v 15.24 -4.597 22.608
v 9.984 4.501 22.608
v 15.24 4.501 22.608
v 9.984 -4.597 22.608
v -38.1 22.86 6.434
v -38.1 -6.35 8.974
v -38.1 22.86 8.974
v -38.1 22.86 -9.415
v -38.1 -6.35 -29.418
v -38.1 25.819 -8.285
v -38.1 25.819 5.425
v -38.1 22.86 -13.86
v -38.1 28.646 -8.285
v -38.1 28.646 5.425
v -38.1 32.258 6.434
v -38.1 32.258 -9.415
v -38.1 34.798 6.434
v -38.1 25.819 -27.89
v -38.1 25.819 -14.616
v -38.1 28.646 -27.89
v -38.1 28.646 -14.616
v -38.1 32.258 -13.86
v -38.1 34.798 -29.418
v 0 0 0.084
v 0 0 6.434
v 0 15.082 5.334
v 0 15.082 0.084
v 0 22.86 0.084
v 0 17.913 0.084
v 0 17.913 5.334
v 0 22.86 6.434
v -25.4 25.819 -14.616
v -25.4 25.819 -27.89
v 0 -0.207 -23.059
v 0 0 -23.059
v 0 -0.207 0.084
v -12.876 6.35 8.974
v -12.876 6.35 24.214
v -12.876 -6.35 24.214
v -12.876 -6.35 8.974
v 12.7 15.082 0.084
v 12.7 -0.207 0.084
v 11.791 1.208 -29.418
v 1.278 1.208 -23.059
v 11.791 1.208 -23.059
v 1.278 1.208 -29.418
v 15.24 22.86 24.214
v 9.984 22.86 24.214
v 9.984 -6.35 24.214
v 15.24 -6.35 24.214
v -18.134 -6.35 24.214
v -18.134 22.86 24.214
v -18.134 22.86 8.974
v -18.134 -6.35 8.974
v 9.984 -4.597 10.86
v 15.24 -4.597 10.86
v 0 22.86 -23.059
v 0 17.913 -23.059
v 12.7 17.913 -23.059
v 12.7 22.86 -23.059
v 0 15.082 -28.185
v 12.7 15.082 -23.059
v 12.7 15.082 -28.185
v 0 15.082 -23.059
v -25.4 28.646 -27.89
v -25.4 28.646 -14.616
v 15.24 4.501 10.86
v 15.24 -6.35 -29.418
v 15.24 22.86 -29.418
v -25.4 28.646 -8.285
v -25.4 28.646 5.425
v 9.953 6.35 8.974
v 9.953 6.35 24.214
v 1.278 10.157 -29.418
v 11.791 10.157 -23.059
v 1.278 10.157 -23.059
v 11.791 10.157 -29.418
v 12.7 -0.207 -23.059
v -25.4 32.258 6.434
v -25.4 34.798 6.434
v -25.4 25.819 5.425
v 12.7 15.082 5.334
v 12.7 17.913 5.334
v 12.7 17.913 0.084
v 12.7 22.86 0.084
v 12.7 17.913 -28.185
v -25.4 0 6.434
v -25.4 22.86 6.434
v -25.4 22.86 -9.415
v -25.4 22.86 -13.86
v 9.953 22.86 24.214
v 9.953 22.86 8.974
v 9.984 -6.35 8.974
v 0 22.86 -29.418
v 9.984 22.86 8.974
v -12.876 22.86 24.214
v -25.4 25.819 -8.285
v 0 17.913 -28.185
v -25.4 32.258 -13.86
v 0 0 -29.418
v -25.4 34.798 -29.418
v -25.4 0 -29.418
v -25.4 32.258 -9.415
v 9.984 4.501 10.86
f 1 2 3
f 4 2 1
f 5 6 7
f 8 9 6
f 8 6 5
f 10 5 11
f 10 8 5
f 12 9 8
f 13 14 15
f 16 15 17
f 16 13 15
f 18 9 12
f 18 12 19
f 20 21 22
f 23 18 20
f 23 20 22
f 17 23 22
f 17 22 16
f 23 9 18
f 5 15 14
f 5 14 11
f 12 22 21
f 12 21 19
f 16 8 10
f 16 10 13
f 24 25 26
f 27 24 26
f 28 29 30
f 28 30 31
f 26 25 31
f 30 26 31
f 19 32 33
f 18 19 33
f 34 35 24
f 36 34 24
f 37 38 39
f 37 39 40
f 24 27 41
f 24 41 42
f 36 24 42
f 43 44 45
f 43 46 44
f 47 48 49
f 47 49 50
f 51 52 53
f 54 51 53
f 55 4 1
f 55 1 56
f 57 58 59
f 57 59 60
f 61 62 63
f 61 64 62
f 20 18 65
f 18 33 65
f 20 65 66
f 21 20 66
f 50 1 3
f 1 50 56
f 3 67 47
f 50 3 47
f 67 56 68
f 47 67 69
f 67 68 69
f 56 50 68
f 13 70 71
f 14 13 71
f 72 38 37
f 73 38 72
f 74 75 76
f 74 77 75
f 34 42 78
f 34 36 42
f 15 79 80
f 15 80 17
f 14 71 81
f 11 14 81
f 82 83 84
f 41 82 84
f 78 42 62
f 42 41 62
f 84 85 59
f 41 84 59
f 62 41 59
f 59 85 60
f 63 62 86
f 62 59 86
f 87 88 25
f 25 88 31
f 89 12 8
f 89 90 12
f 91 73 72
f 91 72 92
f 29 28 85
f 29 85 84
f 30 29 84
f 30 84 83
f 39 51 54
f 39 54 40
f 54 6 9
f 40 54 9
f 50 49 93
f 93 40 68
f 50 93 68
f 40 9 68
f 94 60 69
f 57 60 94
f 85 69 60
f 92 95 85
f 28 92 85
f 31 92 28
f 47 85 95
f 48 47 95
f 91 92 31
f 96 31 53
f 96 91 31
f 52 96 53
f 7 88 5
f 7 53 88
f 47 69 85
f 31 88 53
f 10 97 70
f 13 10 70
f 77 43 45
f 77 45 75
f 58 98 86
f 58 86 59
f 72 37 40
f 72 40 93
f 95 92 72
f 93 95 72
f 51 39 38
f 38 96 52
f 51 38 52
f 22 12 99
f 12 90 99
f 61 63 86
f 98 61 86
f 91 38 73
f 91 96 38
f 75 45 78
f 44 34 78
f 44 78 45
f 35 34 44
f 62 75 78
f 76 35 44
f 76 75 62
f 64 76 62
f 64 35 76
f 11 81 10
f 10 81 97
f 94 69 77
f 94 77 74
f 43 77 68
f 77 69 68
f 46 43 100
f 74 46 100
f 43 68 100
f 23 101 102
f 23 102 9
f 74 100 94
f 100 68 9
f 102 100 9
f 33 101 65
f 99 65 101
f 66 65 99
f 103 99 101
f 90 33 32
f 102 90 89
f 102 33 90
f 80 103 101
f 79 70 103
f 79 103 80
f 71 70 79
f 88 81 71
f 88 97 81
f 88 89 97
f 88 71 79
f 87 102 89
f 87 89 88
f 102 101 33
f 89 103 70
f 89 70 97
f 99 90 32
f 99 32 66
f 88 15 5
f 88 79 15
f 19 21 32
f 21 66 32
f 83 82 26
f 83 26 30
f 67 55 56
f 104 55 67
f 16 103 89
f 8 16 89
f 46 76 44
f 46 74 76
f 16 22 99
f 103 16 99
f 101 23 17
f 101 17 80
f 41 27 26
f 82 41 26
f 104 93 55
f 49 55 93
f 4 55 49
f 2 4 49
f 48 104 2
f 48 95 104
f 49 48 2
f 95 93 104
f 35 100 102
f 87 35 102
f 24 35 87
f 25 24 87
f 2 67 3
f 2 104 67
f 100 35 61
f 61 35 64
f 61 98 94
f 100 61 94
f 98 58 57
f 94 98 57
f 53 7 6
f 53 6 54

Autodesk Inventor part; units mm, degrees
ref_plane "YZ Plane" through (0, 0, 0) normal (1, 0, 0) x (0, 1, 0)
ref_plane "XZ Plane" through (0, 0, 0) normal (0, 1, 0) x (-1, 0, 0)
ref_plane "XY Plane" through (0, 0, 0) normal (0, 0, 1) x (1, 0, 0)
sketch "Sketch1" plane through (0, 0, 0) normal (1, 0, 0) x (0, 1, 0)
  line L0 (0, 0) -> (22.86, 0)
  line L1 (22.86, 0) -> (22.86, -22.86)
  line L2 (22.86, -22.86) -> (0, -22.86)
  line L3 (0, -22.86) -> (0, 0)
  line L4 (0, -22.86) -> (15.24, -22.86)
  line L5 (0, -22.86) -> (15.24, -22.86) construction
  line L6 (15.24, -22.86) -> (15.24, -27.94)
  line L7 (15.24, -27.94) -> (17.78, -27.94)
  line L8 (17.78, -27.94) -> (17.78, -22.86)
  line L9 (17.78, 0) -> (17.78, 5.08)
  line L10 (17.78, 5.08) -> (15.24, 5.08)
  line L11 (15.24, 5.08) -> (15.24, 0)
  line L12 (17.9128, 0) -> (15.0818, 0)
  line L13 (15.0818, 5.3336) -> (17.9128, 5.3336)
  line L14 (17.9128, -22.86) -> (15.0818, -22.86)
  line L15 (15.0818, -28.1853) -> (17.9128, -28.1853)
  line L16 (17.9128, 0.0837) -> (17.9128, 5.3336)
  line L17 (15.0818, 0.0837) -> (15.0818, 5.3336)
  line L18 (15.0818, 0.0837) -> (-0.2071, 0.0837)
  line L19 (-0.2071, 0.0837) -> (-0.2071, -23.0588)
  line L20 (-0.2071, -23.0588) -> (15.0818, -23.0588)
  line L21 (15.0818, -23.0588) -> (15.0818, -28.1853)
  line L22 (17.9128, -28.1853) -> (17.9128, -23.0588)
  line L23 (17.9128, -23.0588) -> (22.86, -23.0588)
  line L24 (22.86, -23.0588) -> (22.86, -29.4177)
  line L25 (22.86, -29.4177) -> (-6.35, -29.4177)
  line L26 (22.86, 0.0837) -> (17.9128, 0.0837)
  line L27 (22.86, 0.0837) -> (22.86, 6.4337)
  line L28 (22.86, 6.4337) -> (-6.35, 6.4337)
  line L29 (-6.35, -29.4177) -> (-6.35, 6.4337)
  dimension "d0" = 22.86
  dimension "d1" = 22.86
  dimension "d4" = 5.08
  dimension "d5" = 2.54
  dimension "d6" = 5.08
  dimension "d7" = 2.54
  dimension "d9" = 29.21
  dimension "d11" = 6.35
extrude "Extrusion1" add sketch "Sketch1" along normal blind 12.7 contours L17 L18 L19 L20 L21 L15 L22 L23 L24 L25 L29 L28 L27 L26 L16 L13
sketch "Sketch2" plane through (12.7, 0, 0) normal (1, 0, 0) x (0, 0, -1)
  line L0 (-6.4337, 22.86) -> (-6.4337, -6.35) projected
  line L1 (29.4177, 22.86) -> (23.0588, 22.86) projected
  line L2 (-6.4337, -6.35) -> (29.4177, -6.35)
  line L3 (29.4177, -6.35) -> (29.4177, 22.86)
  line L4 (29.4177, 22.86) -> (-6.4337, 22.86)
  line L5 (-6.4337, 22.86) -> (-6.4337, -6.35)
  point P0 (0, 0)
  dimension "d16" = 29.21
  dimension "d17" = 35.8513
extrude "Extrusion2" add sketch "Sketch2" along normal blind 2.54
sketch "Sketch3" plane through (0, 0, 0) normal (-1, 0, 0) x (0, 0, 1)
  line L0 (-29.4177, -6.35) -> (-29.4177, 22.86) projected
  line L1 (6.4337, -6.35) -> (-29.4177, -6.35) projected
  line L2 (-29.4177, 0) -> (6.4337, 0)
  line L3 (6.4337, 0) -> (6.4337, -6.35)
  line L4 (6.4337, -6.35) -> (-29.4177, -6.35)
  line L5 (-29.4177, -6.35) -> (-29.4177, 0)
  point P0 (0, 0)
extrude "Extrusion3" add sketch "Sketch3" along normal blind 25.4
sketch "Sketch4" plane through (-25.4, 0, 0) normal (-1, 0, 0) x (0, 0, 1)
  line L0 (6.4337, -6.35) -> (-29.4177, -6.35) projected
  line L1 (6.4337, 22.86) -> (6.4337, -6.35) projected
  line L2 (-29.4177, -6.35) -> (6.4337, -6.35)
  line L3 (6.4337, -6.35) -> (6.4337, 22.86)
  line L4 (-29.4177, 22.86) -> (-29.4177, -6.35)
  line L5 (6.4337, 32.258) -> (-29.4177, 32.258)
  line L6 (-29.4177, 32.258) -> (-29.4177, 22.86)
  line L7 (-29.4177, 32.258) -> (-7.1927, 32.258)
  line L8 (-7.1927, 32.258) -> (-11.6377, 32.258)
  line L9 (-29.4177, 22.86) -> (6.4337, 22.86) projected
  line L10 (-11.6377, 32.258) -> (-9.4152, 32.258)
  line L11 (-9.4152, 22.86) -> (-11.6377, 22.86)
  line L12 (-9.4152, 22.86) -> (-13.8602, 22.86)
  line L13 (-13.8602, 22.86) -> (-13.8602, 32.258)
  line L14 (-13.8602, 32.258) -> (-9.4152, 32.258)
  line L15 (-27.8895, 28.6463) -> (-14.6164, 28.6463)
  line L16 (-14.6164, 28.6463) -> (-14.6164, 25.8191)
  line L17 (-14.6164, 25.8191) -> (-27.8895, 25.8191)
  line L18 (-27.8895, 25.8191) -> (-27.8895, 28.6463)
  line L19 (-8.2851, 28.6463) -> (5.4248, 28.6463)
  line L20 (5.4248, 28.6463) -> (5.4248, 25.8191)
  line L21 (5.4248, 25.8191) -> (-8.2851, 25.8191)
  line L22 (-8.2851, 25.8191) -> (-8.2851, 28.6463)
  line L23 (-8.2851, 28.6463) -> (5.4248, 28.6463)
  line L24 (5.4248, 28.6463) -> (5.4248, 25.8191)
  line L25 (5.4248, 25.8191) -> (-8.2851, 25.8191)
  line L26 (-8.2851, 25.8191) -> (-8.2851, 28.6463)
  line L27 (6.4337, 32.258) -> (-9.4152, 32.258)
  line L28 (-9.4152, 32.258) -> (-9.4152, 22.86)
  line L29 (-9.4152, 22.86) -> (6.4337, 22.86)
  line L30 (6.4337, 22.86) -> (6.4337, 32.258)
  line L31 (-29.4177, -6.35) -> (-29.4177, 22.86) projected
  line L32 (0.0837, 22.86) -> (6.4337, 22.86) projected
  line L33 (-29.4177, 22.86) -> (6.4337, 22.86)
  line L34 (6.4337, 22.86) -> (6.4337, 32.258)
  line L35 (6.4337, 32.258) -> (-29.4177, 32.258)
  line L36 (-29.4177, 22.86) -> (-29.4177, 32.258)
  point P0 (0, 0)
  dimension "d21" = 22.225
  dimension "d23" = 2.2225
  dimension "d24" = 4.445
extrude "Extrusion7" add sketch "Sketch4" along normal blind 12.7 contours L0 L4 L9 L1 | L9 L28 L5 L30 | L6 L5 L13 L9
sketch "Sketch6" plane through (-25.4, 32.258, -13.8602) normal (0, 1, 0) x (1, 0, 0)
  line L0 (0, 15.5575) -> (-12.7, 15.5575) projected
  line L1 (0, -20.2938) -> (-12.7, -20.2938) projected
  line L2 (-12.7, 15.5575) -> (0, 15.5575)
  line L3 (0, 15.5575) -> (0, -20.2938)
  line L4 (0, -20.2938) -> (-12.7, -20.2938)
  line L5 (-12.7, -20.2938) -> (-12.7, 15.5575)
  point P0 (25.4, -13.8602)
extrude "Extrusion8" add sketch "Sketch6" along normal blind 2.54
sketch "Sketch7" plane through (0, 22.86, 6.4337) normal (0, 0, 1) x (1, 0, 0)
  line L0 (0, 0) -> (15.24, 0) projected
  line L1 (-38.1, -29.21) -> (-38.1, 11.938) projected
  line L2 (15.24, 0) -> (-38.1, 0)
  line L3 (-38.1, 0) -> (-38.1, -29.21)
  line L4 (-38.1, -29.21) -> (15.24, -29.21)
  line L5 (15.24, -29.21) -> (15.24, 0)
  point P0 (0, -22.86)
extrude "Extrusion9" add sketch "Sketch7" along normal blind 2.54
sketch "Sketch8" plane through (0, 22.86, -23.0588) normal (0, 1, 0) x (1, 0, 0)
  line L0 (15.24, -32.0324) -> (-38.1, -32.0324) projected
  line L1 (-12.8761, -32.0324) -> (9.9839, -32.0324)
  line L2 (-12.8761, -47.2724) -> (-12.8761, -32.0324)
  line L3 (9.9839, -47.2724) -> (15.24, -47.2724)
  line L4 (15.24, -32.0324) -> (9.9839, -32.0324)
  line L5 (9.9839, -32.0324) -> (9.9839, -47.2724)
  line L6 (-12.8761, -47.2724) -> (-18.1339, -47.2724)
  line L7 (-18.1339, -32.0324) -> (-12.8761, -32.0324)
  line L8 (-12.8761, -32.0324) -> (-12.8761, -47.2724)
  line L9 (9.9839, -32.0324) -> (15.24, -32.0324)
  line L10 (15.24, -47.2724) -> (9.9839, -47.2724)
  line L11 (9.9839, -47.2724) -> (9.9839, -32.0324)
  line L12 (-18.1339, -32.0324) -> (15.24, -32.0324)
  line L13 (15.24, -32.0324) -> (15.24, -47.2724)
  line L14 (15.24, -32.0324) -> (9.9839, -32.0324)
  line L15 (-18.1339, -47.2724) -> (-18.1339, -32.0324)
  line L16 (-12.8761, -32.0324) -> (-18.1339, -32.0324)
  point P0 (0, -23.0588)
  dimension "d37" = 22.86
  dimension "d39" = 5.2578
extrude "Extrusion11" add sketch "Sketch8" against normal blind 29.21
sketch "Sketch9" plane through (-18.1339, 22.86, 24.2137) normal (0, 0, 1) x (1, 0, 0)
  line L0 (5.2578, -29.21) -> (0, -29.21) projected
  line L1 (5.2578, 0) -> (5.2578, -29.21) projected
  line L2 (5.2578, -16.51) -> (28.0868, -16.51)
  line L3 (28.0868, -16.51) -> (28.0868, 0)
  line L4 (28.0868, 0) -> (5.2578, 0)
  line L5 (5.2578, 0) -> (5.2578, -16.51)
  point P0 (18.1339, -22.86)
  dimension "d44" = 12.7
extrude "Extrusion12" add sketch "Sketch9" against normal blind 15.5575
sketch "Sketch10" plane through (9.9839, 22.86, 8.9737) normal (-1, 0, 0) x (0, 0, 1)
  line L0 (1.8867, -18.3591) -> (13.634, -18.3591)
  line L1 (13.634, -18.3591) -> (13.634, -27.4569)
  line L2 (13.634, -27.4569) -> (1.8867, -27.4569)
  line L3 (1.8867, -27.4569) -> (1.8867, -18.3591)
  point P0 (-8.9737, -22.86)
extrude "Extrusion13" cut sketch "Sketch10" against normal blind 15.5575
sketch "Sketch11" plane through (15.24, 22.86, -29.4177) normal (0, 0, -1) x (-1, 0, 0)
  line L0 (3.4492, -12.7029) -> (13.9615, -12.7029)
  line L1 (13.9615, -12.7029) -> (13.9615, -21.6525)
  line L2 (13.9615, -21.6525) -> (3.4492, -21.6525)
  line L3 (3.4492, -21.6525) -> (3.4492, -12.7029)
  point P0 (15.24, -22.86)
extrude "Extrusion14" cut sketch "Sketch11" against normal blind 15.5575
properties part number "thingy_for_arms_servo"
